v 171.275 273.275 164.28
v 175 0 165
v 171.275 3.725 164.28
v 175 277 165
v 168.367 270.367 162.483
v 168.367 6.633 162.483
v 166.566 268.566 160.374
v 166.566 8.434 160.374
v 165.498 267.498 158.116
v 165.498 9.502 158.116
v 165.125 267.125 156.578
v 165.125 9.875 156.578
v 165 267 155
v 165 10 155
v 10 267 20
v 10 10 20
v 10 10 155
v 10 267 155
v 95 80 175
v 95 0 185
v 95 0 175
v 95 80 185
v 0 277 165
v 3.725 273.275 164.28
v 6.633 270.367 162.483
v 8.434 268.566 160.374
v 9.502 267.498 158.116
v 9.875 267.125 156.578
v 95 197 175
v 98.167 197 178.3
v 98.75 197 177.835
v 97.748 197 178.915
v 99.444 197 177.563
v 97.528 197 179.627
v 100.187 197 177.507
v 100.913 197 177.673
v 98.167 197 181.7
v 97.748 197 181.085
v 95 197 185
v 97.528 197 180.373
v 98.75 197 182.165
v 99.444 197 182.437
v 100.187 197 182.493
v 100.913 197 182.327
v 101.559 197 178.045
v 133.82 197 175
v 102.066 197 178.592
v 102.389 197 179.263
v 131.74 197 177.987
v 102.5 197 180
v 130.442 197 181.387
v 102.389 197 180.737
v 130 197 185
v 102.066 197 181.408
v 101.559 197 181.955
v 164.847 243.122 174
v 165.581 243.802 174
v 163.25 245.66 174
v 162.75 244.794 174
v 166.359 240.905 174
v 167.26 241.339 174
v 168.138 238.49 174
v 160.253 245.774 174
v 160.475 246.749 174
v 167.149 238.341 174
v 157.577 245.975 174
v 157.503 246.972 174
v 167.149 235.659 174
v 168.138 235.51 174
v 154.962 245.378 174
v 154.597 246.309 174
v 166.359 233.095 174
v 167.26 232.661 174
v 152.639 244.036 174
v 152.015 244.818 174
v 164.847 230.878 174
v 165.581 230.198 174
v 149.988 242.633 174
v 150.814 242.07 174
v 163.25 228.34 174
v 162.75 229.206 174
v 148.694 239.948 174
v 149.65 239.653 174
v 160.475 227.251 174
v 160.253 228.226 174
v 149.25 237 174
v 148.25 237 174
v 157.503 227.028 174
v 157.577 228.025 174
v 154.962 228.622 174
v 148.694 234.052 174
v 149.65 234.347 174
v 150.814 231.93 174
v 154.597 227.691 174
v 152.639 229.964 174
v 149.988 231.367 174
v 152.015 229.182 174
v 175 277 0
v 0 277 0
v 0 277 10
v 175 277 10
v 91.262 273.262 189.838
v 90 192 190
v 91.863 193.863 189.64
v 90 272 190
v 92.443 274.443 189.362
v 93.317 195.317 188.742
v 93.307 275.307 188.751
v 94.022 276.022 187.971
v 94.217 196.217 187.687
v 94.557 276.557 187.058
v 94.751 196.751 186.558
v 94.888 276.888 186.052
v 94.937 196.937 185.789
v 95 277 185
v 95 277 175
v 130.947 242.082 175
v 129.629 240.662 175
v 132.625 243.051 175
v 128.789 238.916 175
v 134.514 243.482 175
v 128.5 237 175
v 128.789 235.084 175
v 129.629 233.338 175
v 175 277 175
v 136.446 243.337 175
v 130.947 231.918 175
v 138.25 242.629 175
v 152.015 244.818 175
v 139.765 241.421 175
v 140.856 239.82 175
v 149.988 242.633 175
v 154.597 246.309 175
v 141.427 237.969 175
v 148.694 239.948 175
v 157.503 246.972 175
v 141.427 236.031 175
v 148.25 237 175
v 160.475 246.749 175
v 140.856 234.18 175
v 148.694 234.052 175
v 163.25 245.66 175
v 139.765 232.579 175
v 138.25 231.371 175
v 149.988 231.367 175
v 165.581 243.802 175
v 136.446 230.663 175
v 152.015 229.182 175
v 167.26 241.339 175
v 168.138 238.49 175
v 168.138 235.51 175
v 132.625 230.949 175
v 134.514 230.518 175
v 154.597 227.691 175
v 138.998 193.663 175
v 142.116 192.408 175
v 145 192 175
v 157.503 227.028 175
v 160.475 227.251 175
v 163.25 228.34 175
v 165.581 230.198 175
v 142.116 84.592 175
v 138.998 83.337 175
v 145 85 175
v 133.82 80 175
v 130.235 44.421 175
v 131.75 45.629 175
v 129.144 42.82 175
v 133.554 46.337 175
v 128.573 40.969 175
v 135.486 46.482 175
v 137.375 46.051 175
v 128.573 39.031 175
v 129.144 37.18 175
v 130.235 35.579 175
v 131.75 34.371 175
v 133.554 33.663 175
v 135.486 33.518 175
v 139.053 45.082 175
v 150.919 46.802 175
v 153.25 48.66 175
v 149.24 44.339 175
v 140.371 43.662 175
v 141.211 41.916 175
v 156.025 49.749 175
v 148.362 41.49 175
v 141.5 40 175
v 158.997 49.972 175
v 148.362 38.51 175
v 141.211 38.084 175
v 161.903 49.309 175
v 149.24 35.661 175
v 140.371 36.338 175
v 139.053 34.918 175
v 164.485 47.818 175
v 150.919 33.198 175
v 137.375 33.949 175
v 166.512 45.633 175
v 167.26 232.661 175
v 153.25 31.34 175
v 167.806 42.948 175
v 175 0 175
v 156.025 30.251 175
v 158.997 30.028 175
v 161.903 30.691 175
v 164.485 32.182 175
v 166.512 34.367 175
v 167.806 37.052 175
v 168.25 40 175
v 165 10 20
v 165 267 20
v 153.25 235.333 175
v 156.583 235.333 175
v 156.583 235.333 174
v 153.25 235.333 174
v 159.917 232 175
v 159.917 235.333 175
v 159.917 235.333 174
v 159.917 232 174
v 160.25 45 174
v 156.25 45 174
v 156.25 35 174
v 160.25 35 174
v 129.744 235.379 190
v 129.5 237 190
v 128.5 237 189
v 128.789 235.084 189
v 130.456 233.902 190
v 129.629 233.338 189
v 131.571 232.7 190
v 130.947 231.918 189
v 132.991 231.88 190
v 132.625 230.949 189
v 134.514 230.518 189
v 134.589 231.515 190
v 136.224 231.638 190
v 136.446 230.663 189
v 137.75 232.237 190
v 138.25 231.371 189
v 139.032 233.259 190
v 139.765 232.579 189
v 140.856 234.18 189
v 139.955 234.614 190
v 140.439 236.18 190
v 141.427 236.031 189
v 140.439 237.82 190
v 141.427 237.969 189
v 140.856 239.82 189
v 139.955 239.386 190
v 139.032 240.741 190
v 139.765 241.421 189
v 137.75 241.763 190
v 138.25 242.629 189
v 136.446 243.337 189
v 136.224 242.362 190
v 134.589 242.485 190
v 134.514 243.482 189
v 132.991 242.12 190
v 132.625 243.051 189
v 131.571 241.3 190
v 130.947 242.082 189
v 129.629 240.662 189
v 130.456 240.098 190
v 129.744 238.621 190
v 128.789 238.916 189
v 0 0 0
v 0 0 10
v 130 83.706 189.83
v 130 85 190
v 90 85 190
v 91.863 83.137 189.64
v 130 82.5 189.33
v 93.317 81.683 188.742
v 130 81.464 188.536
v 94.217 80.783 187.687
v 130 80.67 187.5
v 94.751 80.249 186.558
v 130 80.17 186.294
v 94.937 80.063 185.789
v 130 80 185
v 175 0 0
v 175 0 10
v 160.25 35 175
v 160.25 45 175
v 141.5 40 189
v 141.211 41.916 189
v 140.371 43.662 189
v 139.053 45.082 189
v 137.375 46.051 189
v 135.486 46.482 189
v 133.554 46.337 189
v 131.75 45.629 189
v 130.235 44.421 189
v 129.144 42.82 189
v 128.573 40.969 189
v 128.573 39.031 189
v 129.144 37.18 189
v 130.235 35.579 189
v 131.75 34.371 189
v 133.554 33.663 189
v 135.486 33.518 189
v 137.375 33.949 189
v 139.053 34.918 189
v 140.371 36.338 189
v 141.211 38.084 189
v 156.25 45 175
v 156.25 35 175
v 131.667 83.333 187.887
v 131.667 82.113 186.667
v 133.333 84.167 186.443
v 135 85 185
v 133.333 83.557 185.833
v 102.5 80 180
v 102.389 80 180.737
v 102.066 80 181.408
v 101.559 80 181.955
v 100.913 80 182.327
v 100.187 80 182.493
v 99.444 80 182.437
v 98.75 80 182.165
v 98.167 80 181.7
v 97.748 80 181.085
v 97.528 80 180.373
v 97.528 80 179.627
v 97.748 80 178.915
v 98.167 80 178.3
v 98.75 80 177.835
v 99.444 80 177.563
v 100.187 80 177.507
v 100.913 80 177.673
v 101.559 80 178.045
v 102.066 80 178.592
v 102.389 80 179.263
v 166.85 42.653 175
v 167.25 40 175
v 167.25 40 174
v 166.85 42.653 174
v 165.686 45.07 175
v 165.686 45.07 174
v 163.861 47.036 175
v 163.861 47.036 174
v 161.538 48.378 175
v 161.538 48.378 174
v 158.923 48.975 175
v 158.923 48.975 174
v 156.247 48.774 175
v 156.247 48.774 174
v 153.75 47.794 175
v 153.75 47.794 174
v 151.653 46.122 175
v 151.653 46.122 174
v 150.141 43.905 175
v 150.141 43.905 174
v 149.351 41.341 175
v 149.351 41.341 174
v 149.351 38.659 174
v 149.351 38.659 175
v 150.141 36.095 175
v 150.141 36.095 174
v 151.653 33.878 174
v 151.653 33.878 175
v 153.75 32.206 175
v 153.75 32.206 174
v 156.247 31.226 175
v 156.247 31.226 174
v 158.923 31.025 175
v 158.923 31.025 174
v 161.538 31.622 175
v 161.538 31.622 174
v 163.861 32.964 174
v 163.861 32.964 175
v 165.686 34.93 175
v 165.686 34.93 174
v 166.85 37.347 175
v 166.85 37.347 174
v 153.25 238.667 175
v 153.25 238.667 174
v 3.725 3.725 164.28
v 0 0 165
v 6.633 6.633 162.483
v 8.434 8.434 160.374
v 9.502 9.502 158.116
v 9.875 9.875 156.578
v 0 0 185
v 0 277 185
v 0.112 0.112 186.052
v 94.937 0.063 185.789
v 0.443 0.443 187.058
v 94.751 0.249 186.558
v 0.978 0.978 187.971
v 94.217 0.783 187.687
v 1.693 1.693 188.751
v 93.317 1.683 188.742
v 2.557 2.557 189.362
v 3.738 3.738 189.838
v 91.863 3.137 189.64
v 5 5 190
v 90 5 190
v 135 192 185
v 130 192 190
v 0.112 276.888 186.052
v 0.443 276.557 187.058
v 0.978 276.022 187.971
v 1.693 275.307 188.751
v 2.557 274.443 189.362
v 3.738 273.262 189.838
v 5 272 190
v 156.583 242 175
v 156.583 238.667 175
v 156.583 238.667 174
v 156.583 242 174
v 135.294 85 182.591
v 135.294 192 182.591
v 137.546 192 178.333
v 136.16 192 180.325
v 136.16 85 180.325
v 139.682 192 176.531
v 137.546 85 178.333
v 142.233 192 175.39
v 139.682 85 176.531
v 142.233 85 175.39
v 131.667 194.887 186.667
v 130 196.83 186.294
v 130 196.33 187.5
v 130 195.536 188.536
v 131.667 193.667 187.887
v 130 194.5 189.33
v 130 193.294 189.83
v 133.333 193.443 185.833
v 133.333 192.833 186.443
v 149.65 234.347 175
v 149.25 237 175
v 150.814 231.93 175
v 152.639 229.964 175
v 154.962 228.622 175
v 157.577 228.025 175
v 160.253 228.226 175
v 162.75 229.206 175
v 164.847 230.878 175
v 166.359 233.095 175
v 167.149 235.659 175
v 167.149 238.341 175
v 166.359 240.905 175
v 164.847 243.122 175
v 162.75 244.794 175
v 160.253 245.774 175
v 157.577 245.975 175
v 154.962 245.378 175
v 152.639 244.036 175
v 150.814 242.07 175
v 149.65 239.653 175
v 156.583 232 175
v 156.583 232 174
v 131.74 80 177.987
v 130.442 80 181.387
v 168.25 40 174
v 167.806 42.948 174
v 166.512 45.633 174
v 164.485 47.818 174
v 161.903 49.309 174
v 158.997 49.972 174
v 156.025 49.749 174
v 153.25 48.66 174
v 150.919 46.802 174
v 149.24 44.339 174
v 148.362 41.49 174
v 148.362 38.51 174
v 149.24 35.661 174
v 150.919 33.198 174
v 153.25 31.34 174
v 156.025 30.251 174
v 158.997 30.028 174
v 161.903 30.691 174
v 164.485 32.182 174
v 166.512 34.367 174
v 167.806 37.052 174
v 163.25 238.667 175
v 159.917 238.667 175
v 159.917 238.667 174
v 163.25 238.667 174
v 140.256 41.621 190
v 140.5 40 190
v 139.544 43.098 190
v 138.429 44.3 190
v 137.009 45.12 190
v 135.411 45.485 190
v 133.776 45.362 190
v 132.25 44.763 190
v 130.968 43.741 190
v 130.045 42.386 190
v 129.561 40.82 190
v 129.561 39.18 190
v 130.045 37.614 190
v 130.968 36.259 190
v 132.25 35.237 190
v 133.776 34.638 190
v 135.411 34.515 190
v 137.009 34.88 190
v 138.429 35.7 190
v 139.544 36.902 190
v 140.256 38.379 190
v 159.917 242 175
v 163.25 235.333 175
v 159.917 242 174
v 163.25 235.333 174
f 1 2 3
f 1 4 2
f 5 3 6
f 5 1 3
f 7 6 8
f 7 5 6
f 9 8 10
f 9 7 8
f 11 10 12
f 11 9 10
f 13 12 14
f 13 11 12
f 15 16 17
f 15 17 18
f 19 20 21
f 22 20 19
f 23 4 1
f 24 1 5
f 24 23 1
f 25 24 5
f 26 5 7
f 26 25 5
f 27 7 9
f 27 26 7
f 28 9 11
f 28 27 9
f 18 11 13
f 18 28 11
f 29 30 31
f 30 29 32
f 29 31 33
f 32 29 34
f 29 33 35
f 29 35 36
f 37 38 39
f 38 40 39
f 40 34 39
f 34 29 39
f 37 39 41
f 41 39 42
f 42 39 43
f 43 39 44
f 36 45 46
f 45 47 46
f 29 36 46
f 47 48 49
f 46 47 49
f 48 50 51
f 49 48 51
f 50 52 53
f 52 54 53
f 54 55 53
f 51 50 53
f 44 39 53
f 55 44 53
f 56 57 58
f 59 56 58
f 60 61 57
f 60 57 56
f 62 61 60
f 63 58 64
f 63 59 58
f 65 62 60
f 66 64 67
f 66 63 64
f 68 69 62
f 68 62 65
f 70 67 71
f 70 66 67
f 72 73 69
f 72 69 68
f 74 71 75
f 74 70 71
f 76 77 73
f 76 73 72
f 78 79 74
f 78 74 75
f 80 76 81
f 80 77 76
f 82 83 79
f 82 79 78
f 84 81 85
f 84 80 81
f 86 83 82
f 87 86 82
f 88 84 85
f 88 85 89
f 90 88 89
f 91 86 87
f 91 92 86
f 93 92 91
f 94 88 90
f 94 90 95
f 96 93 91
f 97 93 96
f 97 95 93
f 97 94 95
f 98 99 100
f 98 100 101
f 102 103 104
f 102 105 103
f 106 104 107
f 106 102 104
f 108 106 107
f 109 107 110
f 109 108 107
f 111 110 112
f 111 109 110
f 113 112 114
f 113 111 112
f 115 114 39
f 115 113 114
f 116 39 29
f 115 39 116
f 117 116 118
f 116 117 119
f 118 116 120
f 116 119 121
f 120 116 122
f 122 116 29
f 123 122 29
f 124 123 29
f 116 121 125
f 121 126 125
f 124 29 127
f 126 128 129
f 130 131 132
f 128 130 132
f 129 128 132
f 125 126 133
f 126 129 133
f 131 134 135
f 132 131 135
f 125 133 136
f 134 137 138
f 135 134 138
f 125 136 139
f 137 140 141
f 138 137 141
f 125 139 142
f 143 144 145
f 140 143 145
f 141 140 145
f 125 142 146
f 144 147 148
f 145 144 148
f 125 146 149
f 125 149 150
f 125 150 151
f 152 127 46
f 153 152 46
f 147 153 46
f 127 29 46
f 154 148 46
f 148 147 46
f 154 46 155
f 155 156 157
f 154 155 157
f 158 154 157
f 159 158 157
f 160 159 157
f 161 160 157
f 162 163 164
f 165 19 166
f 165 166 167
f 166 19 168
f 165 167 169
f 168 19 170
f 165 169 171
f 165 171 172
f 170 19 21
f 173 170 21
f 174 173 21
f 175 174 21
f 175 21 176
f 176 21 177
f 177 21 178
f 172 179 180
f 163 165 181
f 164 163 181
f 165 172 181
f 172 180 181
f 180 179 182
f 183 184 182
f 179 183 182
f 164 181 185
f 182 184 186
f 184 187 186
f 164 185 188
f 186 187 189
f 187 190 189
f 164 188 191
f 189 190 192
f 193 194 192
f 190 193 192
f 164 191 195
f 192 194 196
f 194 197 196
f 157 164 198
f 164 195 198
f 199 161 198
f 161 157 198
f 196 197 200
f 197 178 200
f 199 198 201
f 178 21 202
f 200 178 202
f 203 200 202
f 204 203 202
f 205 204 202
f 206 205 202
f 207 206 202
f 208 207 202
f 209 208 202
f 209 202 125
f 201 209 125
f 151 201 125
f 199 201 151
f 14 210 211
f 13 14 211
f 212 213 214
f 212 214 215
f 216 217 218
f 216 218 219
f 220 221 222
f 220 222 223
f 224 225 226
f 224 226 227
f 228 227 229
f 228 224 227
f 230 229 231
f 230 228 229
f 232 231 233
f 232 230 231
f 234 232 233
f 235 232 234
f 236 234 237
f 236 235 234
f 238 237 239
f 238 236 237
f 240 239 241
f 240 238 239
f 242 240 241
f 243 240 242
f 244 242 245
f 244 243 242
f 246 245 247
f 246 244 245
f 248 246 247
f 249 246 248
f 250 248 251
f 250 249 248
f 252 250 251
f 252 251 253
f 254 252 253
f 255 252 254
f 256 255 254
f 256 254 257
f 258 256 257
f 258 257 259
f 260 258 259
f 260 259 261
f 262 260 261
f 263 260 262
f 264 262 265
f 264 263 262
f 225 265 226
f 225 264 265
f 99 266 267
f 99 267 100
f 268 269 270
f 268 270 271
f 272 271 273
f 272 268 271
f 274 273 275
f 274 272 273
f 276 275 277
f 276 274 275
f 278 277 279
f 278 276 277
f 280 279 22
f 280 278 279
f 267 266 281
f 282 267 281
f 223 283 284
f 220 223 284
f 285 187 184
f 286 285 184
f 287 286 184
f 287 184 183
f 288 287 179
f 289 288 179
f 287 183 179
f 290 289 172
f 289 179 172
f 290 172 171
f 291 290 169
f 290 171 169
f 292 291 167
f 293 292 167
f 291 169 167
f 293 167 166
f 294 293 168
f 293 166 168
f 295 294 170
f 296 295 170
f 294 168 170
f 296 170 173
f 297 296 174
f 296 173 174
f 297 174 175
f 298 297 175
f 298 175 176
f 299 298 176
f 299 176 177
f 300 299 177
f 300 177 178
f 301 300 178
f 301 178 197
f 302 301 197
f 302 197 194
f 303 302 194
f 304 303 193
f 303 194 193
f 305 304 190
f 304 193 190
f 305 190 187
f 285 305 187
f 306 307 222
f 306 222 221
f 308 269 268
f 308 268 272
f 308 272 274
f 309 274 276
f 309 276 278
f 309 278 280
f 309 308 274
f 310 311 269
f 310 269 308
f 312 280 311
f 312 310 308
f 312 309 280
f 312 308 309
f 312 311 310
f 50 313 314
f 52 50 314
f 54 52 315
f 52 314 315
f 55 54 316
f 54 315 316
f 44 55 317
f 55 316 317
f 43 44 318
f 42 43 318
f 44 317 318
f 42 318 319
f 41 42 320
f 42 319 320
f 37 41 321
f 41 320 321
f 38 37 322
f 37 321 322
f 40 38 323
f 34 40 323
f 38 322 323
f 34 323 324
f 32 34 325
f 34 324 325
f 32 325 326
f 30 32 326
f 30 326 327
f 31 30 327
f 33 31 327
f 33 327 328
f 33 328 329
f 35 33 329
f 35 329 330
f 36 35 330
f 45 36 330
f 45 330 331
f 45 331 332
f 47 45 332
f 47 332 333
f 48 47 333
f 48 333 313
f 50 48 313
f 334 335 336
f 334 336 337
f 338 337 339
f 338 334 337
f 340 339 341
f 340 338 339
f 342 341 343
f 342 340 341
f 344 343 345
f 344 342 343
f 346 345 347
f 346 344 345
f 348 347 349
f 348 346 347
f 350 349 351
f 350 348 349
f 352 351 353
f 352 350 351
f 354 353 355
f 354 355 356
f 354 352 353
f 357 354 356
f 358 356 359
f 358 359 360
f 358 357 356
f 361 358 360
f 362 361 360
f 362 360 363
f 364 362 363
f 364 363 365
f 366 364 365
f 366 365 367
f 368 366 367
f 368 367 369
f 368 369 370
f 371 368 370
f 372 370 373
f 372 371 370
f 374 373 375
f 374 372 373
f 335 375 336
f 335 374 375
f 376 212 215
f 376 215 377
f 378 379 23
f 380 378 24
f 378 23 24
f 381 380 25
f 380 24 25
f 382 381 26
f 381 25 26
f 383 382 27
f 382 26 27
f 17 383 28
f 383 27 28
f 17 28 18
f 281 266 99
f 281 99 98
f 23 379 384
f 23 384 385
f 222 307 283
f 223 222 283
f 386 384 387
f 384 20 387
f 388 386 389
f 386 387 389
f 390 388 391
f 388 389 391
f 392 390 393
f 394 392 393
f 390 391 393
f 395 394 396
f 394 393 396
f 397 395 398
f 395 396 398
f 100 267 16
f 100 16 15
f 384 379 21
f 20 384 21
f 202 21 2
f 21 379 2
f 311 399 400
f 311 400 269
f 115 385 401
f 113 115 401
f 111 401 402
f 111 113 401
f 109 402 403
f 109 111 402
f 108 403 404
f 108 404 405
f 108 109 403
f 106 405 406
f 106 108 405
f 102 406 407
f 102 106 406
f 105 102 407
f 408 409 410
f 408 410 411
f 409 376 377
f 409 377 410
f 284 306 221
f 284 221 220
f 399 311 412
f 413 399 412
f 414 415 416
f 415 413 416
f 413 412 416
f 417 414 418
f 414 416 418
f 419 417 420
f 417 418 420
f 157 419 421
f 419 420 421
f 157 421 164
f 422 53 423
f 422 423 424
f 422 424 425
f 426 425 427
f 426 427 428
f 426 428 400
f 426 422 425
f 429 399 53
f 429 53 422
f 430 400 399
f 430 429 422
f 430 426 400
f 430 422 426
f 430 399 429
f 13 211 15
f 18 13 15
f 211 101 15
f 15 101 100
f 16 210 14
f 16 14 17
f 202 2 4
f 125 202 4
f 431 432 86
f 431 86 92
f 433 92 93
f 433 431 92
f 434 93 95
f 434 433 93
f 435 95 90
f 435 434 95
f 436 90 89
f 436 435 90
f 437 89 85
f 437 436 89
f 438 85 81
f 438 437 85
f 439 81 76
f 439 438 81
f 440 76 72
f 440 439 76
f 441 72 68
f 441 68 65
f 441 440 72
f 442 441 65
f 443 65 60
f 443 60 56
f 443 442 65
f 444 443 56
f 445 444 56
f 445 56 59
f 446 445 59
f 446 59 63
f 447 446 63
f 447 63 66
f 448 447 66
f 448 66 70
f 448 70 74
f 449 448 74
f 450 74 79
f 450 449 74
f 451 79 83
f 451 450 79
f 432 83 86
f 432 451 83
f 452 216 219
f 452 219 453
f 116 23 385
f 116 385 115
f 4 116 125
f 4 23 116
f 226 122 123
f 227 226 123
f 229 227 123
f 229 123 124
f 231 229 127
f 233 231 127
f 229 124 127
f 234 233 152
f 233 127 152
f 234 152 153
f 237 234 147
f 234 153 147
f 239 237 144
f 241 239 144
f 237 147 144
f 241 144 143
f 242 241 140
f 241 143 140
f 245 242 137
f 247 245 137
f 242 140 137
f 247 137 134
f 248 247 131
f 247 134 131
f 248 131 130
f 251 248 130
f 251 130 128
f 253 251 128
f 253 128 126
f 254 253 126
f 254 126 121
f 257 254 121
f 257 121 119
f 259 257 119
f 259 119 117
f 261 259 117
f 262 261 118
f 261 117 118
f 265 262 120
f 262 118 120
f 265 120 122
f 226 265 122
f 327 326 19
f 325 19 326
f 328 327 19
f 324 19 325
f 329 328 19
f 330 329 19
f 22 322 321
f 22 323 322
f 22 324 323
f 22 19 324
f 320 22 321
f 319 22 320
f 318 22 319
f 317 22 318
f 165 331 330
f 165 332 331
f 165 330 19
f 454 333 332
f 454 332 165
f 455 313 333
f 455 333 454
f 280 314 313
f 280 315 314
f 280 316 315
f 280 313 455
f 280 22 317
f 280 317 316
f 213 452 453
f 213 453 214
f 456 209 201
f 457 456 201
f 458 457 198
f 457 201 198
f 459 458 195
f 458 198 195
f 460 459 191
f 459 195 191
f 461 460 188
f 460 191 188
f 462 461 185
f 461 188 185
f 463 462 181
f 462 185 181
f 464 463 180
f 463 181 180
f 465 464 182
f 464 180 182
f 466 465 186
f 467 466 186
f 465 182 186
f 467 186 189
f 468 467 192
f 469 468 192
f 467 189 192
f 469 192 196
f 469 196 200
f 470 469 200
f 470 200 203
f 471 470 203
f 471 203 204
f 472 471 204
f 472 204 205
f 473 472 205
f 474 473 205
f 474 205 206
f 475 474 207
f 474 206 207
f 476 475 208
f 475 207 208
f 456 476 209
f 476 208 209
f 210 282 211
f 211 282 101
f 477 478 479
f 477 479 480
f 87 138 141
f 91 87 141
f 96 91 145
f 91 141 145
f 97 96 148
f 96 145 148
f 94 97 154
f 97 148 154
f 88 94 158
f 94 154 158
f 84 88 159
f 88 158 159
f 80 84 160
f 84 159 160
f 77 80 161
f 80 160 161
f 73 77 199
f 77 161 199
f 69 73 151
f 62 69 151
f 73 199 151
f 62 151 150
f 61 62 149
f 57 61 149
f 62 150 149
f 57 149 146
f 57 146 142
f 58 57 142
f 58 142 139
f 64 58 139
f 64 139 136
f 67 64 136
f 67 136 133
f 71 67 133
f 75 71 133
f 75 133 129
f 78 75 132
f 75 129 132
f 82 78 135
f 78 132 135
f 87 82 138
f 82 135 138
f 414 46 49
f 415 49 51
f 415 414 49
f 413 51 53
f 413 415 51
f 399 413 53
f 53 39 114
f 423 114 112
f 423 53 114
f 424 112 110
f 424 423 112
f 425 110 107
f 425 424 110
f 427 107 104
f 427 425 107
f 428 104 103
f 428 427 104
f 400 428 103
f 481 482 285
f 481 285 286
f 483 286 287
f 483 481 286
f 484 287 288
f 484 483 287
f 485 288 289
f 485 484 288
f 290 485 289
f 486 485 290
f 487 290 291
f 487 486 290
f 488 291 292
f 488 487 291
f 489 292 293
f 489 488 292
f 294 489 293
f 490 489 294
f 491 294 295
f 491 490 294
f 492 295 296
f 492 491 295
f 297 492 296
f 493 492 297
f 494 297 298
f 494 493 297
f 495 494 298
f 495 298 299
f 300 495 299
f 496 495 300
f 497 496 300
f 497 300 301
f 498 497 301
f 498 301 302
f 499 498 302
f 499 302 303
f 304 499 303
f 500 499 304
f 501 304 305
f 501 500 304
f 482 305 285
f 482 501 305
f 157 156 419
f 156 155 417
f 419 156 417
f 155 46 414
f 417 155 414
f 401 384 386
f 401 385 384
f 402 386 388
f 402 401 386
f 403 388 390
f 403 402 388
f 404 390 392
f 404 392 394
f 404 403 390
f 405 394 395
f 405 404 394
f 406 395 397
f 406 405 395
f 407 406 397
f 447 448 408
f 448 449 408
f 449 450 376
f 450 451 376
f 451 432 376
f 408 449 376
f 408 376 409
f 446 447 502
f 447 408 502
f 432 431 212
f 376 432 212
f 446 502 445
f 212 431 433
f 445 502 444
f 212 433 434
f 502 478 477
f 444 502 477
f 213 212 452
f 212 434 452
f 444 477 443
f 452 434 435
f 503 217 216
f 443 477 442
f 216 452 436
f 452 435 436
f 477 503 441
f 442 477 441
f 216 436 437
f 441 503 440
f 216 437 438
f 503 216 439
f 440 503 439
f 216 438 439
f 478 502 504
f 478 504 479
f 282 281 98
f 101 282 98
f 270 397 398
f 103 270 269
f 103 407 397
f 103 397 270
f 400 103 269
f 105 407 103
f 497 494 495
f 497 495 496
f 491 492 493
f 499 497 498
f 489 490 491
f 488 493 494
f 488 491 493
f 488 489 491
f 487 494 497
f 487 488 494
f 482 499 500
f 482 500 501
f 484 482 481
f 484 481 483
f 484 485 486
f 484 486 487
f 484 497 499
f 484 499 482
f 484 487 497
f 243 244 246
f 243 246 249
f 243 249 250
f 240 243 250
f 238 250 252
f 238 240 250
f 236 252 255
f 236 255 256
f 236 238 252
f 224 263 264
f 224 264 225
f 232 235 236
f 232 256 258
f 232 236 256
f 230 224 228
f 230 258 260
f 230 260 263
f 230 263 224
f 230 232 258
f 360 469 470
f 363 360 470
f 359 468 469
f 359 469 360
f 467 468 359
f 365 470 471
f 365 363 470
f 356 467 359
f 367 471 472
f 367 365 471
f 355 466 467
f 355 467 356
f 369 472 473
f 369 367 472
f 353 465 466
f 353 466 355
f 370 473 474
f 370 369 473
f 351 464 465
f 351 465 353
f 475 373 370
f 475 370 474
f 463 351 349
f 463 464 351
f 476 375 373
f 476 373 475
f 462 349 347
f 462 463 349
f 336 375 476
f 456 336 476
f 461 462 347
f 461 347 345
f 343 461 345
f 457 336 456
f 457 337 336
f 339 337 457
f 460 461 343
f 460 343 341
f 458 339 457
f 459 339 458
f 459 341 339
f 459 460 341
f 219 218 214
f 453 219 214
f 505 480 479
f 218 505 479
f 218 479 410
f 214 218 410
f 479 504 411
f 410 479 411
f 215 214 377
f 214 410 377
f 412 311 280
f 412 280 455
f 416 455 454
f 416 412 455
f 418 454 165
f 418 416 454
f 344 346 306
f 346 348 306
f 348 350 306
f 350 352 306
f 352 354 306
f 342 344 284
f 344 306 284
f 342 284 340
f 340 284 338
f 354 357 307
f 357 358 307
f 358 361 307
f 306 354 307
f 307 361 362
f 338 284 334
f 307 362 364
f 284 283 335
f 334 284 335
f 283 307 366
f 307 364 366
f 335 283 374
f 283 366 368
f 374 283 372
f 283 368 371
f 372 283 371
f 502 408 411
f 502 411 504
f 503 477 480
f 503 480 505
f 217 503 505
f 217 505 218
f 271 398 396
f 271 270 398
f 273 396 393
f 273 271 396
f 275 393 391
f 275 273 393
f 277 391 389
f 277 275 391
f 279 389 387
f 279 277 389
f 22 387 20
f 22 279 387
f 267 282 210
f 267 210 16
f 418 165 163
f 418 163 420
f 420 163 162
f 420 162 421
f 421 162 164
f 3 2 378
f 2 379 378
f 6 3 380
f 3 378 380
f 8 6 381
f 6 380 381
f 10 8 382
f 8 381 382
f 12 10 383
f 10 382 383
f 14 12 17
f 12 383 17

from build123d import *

# Parameters (mm, degrees)
ESQUISSE1_W              = 175
ESQUISSE1_H              = 277
BOSS_EXTRU_2_DEPTH       = 190
ESQUISSE2_W              = 80
ESQUISSE2_H              = 80
ENL_V_MAT_EXTRU_2_DEPTH  = 15
ESQUISSE6_R              = 6.5
BOSS_EXTRU_4_DEPTH       = 15
CHANFREIN2_SIZE          = 1
ENL_V_START              = -10
ESQUISSE12_OUTSIDE_W     = 252.75
ESQUISSE12_OUTSIDE_H     = 354.75
ESQUISSE12_OUTSIDE_W_2   = 155
ESQUISSE12_OUTSIDE_H_2   = 257
ENL_V_MAT_EXTRU_5_DEPTH  = 155
CHANFREIN5_SIZE          = 10
CONG_1_R                 = 5
ENL_V_MAT_EXTRU_10_REACH = 326.86
ESQUISSE13_R             = 2.5
CHANFREIN8_SIZE          = 5
CONG_3_R                 = 10
ESQUISSE14_R             = 10
ESQUISSE14_R_2           = 9
ENL_V_MAT_EXTRU_11_DEPTH = 1
ESQUISSE15_W             = 4
ESQUISSE15_H             = 10
ENL_V_MAT_EXTRU_12_DEPTH = 1


with BuildPart() as part:
    # Esquisse1 → Boss.-Extru.2 (new body)
    with BuildSketch(Plane.XY):
        with Locations((87.5, 138.5)):
            Rectangle(ESQUISSE1_W, ESQUISSE1_H)
    extrude(amount=BOSS_EXTRU_2_DEPTH)

    # Esquisse2 → Enlèv. mat.-Extru.2 (cut)
    with BuildSketch(Plane.XY.offset(190)):
        with Locations((135, 40)):
            Rectangle(ESQUISSE2_W, ESQUISSE2_H)
        with Locations((135, 237)):
            Rectangle(ESQUISSE2_W, ESQUISSE2_H)
    extrude(amount=-ENL_V_MAT_EXTRU_2_DEPTH, mode=Mode.SUBTRACT)

    # Esquisse6 → Boss.-Extru.4 (add)
    with BuildSketch(Plane.XY.offset(175)):
        with Locations((135, 40)):
            Circle(ESQUISSE6_R)
        with Locations(Location((135, 237, 0), (0, 0, 180))):
            Circle(ESQUISSE6_R)
    extrude(amount=BOSS_EXTRU_4_DEPTH)

    # Chanfrein2
    chanfrein2_edges = [part.edges().sort_by_distance(p)[0] for p in [
        (128.5, 40, 190),
        (141.5, 237, 190),
    ]]
    chamfer(chanfrein2_edges, length=CHANFREIN2_SIZE)

    # Esquisse12 outside → Enlèv. mat.-Extru.5 (cut)
    with BuildSketch(Plane(origin=(0, 0, 0), x_dir=(-1, 0, 0), z_dir=(0, 0, -1)).offset(ENL_V_START)):
        with Locations((-87.5, 138.5)):
            Rectangle(ESQUISSE12_OUTSIDE_W, ESQUISSE12_OUTSIDE_H)
        with Locations((-87.5, 138.5)):
            Rectangle(ESQUISSE12_OUTSIDE_W_2, ESQUISSE12_OUTSIDE_H_2, mode=Mode.SUBTRACT)
    extrude(amount=-ENL_V_MAT_EXTRU_5_DEPTH, mode=Mode.SUBTRACT)

    # Chanfrein5
    chanfrein5_edges = [part.edges().sort_by_distance(p)[0] for p in [
        (165, 138.5, 10),
        (87.5, 267, 10),
        (10, 138.5, 10),
        (87.5, 10, 10),
    ]]
    chamfer(chanfrein5_edges, length=CHANFREIN5_SIZE - 0.0001)  # a hair under: the kernel refuses the full size

    # Congé1
    cong_1_edges = [part.edges().sort_by_distance(p)[0] for p in [
        (175, 138.5, 190),
        (135, 80, 190),
        (95, 40, 190),
        (47.5, 277, 190),
        (95, 237, 190),
        (135, 197, 190),
        (0, 138.5, 190),
        (47.5, 0, 190),
    ]]
    fillet(cong_1_edges, radius=CONG_1_R)

    # Esquisse13 → Enlèv. mat.-Extru.10 (cut, up to next)
    with BuildSketch(Plane.XZ.offset(-80), mode=Mode.PRIVATE) as enl_v_mat_extru_10_sk1:
        with Locations((100, 180)):
            Circle(ESQUISSE13_R)
    enl_v_mat_extru_10_tool1 = extrude(enl_v_mat_extru_10_sk1.sketch, amount=-ENL_V_MAT_EXTRU_10_REACH, mode=Mode.PRIVATE) & part.part
    # Esquisse13 → Enlèv. mat.-Extru.10 (cut, up to next)
    with BuildSketch(Plane.XZ.offset(-80), mode=Mode.PRIVATE) as enl_v_mat_extru_10_sk2:
        with BuildLine():
            Line((145, 175), (175, 175))
            Line((175, 175), (175, 190))
            Line((175, 190), (135, 190))
            Line((135, 190), (135, 185))
            ThreePointArc((135, 185), (137.928932188, 177.928932188), (145, 175))
        make_face()
    enl_v_mat_extru_10_tool2 = extrude(enl_v_mat_extru_10_sk2.sketch, amount=-ENL_V_MAT_EXTRU_10_REACH, mode=Mode.PRIVATE) & part.part
    add(enl_v_mat_extru_10_tool1.solids().sort_by_distance((100, 80, 180))[0], mode=Mode.SUBTRACT)
    add(enl_v_mat_extru_10_tool2.solids().sort_by_distance((155.659019, 80, 182.695347))[0], mode=Mode.SUBTRACT)

    # Chanfrein8
    chanfrein8_edges = [part.edges().sort_by_distance(p)[0] for p in [
        (135, 81.464466094, 188.535533906),
        (137.928932188, 80, 177.928932188),
        (137.928932188, 197, 177.928932188),
        (135, 195.535533906, 188.535533906),
        (135, 138.5, 190),
    ]]
    chamfer(chanfrein8_edges, length=CHANFREIN8_SIZE - 0.0001)  # a hair under: the kernel refuses the full size

    # Congé3
    cong_3_edges = [part.edges().sort_by_distance(p)[0] for p in [
        (87.5, 267, 165),
        (165, 138.5, 165),
        (87.5, 10, 165),
        (10, 138.5, 165),
    ]]
    fillet(cong_3_edges, radius=CONG_3_R - 0.0001)  # a hair under: the kernel refuses the full size

    # Esquisse14 → Enlèv. mat.-Extru.11 (cut)
    # profile 1 of 2: a face of its own
    with BuildSketch(Plane.XY.offset(175)):
        with Locations((158.25, 40)):
            Circle(ESQUISSE14_R)
        with Locations((158.25, 40)):
            Circle(ESQUISSE14_R_2, mode=Mode.SUBTRACT)
    # profile 2 of 2: a face of its own
    with BuildSketch(Plane.XY.offset(175)):
        with Locations(Location((158.25, 237, 0), (0, 0, 180))):
            Circle(ESQUISSE14_R)
        with Locations(Location((158.25, 237, 0), (0, 0, 180))):
            Circle(ESQUISSE14_R_2, mode=Mode.SUBTRACT)
    extrude(amount=-ENL_V_MAT_EXTRU_11_DEPTH, mode=Mode.SUBTRACT)

    # Esquisse15 → Enlèv. mat.-Extru.12 (cut)
    with BuildSketch(Plane.XY.offset(175)):
        with Locations((158.25, 40)):
            Rectangle(ESQUISSE15_W, ESQUISSE15_H)
        Polygon((156.583333333, 235.333333333), (153.25, 235.333333333), (153.25, 238.666666667), (156.583333333, 238.666666667), (156.583333333, 242), (159.916666667, 242), (159.916666667, 238.666666667), (163.25, 238.666666667), (163.25, 235.333333333), (159.916666667, 235.333333333), (159.916666667, 232), (156.583333333, 232), align=None)
    extrude(amount=-ENL_V_MAT_EXTRU_12_DEPTH, mode=Mode.SUBTRACT)


solid = part.part
